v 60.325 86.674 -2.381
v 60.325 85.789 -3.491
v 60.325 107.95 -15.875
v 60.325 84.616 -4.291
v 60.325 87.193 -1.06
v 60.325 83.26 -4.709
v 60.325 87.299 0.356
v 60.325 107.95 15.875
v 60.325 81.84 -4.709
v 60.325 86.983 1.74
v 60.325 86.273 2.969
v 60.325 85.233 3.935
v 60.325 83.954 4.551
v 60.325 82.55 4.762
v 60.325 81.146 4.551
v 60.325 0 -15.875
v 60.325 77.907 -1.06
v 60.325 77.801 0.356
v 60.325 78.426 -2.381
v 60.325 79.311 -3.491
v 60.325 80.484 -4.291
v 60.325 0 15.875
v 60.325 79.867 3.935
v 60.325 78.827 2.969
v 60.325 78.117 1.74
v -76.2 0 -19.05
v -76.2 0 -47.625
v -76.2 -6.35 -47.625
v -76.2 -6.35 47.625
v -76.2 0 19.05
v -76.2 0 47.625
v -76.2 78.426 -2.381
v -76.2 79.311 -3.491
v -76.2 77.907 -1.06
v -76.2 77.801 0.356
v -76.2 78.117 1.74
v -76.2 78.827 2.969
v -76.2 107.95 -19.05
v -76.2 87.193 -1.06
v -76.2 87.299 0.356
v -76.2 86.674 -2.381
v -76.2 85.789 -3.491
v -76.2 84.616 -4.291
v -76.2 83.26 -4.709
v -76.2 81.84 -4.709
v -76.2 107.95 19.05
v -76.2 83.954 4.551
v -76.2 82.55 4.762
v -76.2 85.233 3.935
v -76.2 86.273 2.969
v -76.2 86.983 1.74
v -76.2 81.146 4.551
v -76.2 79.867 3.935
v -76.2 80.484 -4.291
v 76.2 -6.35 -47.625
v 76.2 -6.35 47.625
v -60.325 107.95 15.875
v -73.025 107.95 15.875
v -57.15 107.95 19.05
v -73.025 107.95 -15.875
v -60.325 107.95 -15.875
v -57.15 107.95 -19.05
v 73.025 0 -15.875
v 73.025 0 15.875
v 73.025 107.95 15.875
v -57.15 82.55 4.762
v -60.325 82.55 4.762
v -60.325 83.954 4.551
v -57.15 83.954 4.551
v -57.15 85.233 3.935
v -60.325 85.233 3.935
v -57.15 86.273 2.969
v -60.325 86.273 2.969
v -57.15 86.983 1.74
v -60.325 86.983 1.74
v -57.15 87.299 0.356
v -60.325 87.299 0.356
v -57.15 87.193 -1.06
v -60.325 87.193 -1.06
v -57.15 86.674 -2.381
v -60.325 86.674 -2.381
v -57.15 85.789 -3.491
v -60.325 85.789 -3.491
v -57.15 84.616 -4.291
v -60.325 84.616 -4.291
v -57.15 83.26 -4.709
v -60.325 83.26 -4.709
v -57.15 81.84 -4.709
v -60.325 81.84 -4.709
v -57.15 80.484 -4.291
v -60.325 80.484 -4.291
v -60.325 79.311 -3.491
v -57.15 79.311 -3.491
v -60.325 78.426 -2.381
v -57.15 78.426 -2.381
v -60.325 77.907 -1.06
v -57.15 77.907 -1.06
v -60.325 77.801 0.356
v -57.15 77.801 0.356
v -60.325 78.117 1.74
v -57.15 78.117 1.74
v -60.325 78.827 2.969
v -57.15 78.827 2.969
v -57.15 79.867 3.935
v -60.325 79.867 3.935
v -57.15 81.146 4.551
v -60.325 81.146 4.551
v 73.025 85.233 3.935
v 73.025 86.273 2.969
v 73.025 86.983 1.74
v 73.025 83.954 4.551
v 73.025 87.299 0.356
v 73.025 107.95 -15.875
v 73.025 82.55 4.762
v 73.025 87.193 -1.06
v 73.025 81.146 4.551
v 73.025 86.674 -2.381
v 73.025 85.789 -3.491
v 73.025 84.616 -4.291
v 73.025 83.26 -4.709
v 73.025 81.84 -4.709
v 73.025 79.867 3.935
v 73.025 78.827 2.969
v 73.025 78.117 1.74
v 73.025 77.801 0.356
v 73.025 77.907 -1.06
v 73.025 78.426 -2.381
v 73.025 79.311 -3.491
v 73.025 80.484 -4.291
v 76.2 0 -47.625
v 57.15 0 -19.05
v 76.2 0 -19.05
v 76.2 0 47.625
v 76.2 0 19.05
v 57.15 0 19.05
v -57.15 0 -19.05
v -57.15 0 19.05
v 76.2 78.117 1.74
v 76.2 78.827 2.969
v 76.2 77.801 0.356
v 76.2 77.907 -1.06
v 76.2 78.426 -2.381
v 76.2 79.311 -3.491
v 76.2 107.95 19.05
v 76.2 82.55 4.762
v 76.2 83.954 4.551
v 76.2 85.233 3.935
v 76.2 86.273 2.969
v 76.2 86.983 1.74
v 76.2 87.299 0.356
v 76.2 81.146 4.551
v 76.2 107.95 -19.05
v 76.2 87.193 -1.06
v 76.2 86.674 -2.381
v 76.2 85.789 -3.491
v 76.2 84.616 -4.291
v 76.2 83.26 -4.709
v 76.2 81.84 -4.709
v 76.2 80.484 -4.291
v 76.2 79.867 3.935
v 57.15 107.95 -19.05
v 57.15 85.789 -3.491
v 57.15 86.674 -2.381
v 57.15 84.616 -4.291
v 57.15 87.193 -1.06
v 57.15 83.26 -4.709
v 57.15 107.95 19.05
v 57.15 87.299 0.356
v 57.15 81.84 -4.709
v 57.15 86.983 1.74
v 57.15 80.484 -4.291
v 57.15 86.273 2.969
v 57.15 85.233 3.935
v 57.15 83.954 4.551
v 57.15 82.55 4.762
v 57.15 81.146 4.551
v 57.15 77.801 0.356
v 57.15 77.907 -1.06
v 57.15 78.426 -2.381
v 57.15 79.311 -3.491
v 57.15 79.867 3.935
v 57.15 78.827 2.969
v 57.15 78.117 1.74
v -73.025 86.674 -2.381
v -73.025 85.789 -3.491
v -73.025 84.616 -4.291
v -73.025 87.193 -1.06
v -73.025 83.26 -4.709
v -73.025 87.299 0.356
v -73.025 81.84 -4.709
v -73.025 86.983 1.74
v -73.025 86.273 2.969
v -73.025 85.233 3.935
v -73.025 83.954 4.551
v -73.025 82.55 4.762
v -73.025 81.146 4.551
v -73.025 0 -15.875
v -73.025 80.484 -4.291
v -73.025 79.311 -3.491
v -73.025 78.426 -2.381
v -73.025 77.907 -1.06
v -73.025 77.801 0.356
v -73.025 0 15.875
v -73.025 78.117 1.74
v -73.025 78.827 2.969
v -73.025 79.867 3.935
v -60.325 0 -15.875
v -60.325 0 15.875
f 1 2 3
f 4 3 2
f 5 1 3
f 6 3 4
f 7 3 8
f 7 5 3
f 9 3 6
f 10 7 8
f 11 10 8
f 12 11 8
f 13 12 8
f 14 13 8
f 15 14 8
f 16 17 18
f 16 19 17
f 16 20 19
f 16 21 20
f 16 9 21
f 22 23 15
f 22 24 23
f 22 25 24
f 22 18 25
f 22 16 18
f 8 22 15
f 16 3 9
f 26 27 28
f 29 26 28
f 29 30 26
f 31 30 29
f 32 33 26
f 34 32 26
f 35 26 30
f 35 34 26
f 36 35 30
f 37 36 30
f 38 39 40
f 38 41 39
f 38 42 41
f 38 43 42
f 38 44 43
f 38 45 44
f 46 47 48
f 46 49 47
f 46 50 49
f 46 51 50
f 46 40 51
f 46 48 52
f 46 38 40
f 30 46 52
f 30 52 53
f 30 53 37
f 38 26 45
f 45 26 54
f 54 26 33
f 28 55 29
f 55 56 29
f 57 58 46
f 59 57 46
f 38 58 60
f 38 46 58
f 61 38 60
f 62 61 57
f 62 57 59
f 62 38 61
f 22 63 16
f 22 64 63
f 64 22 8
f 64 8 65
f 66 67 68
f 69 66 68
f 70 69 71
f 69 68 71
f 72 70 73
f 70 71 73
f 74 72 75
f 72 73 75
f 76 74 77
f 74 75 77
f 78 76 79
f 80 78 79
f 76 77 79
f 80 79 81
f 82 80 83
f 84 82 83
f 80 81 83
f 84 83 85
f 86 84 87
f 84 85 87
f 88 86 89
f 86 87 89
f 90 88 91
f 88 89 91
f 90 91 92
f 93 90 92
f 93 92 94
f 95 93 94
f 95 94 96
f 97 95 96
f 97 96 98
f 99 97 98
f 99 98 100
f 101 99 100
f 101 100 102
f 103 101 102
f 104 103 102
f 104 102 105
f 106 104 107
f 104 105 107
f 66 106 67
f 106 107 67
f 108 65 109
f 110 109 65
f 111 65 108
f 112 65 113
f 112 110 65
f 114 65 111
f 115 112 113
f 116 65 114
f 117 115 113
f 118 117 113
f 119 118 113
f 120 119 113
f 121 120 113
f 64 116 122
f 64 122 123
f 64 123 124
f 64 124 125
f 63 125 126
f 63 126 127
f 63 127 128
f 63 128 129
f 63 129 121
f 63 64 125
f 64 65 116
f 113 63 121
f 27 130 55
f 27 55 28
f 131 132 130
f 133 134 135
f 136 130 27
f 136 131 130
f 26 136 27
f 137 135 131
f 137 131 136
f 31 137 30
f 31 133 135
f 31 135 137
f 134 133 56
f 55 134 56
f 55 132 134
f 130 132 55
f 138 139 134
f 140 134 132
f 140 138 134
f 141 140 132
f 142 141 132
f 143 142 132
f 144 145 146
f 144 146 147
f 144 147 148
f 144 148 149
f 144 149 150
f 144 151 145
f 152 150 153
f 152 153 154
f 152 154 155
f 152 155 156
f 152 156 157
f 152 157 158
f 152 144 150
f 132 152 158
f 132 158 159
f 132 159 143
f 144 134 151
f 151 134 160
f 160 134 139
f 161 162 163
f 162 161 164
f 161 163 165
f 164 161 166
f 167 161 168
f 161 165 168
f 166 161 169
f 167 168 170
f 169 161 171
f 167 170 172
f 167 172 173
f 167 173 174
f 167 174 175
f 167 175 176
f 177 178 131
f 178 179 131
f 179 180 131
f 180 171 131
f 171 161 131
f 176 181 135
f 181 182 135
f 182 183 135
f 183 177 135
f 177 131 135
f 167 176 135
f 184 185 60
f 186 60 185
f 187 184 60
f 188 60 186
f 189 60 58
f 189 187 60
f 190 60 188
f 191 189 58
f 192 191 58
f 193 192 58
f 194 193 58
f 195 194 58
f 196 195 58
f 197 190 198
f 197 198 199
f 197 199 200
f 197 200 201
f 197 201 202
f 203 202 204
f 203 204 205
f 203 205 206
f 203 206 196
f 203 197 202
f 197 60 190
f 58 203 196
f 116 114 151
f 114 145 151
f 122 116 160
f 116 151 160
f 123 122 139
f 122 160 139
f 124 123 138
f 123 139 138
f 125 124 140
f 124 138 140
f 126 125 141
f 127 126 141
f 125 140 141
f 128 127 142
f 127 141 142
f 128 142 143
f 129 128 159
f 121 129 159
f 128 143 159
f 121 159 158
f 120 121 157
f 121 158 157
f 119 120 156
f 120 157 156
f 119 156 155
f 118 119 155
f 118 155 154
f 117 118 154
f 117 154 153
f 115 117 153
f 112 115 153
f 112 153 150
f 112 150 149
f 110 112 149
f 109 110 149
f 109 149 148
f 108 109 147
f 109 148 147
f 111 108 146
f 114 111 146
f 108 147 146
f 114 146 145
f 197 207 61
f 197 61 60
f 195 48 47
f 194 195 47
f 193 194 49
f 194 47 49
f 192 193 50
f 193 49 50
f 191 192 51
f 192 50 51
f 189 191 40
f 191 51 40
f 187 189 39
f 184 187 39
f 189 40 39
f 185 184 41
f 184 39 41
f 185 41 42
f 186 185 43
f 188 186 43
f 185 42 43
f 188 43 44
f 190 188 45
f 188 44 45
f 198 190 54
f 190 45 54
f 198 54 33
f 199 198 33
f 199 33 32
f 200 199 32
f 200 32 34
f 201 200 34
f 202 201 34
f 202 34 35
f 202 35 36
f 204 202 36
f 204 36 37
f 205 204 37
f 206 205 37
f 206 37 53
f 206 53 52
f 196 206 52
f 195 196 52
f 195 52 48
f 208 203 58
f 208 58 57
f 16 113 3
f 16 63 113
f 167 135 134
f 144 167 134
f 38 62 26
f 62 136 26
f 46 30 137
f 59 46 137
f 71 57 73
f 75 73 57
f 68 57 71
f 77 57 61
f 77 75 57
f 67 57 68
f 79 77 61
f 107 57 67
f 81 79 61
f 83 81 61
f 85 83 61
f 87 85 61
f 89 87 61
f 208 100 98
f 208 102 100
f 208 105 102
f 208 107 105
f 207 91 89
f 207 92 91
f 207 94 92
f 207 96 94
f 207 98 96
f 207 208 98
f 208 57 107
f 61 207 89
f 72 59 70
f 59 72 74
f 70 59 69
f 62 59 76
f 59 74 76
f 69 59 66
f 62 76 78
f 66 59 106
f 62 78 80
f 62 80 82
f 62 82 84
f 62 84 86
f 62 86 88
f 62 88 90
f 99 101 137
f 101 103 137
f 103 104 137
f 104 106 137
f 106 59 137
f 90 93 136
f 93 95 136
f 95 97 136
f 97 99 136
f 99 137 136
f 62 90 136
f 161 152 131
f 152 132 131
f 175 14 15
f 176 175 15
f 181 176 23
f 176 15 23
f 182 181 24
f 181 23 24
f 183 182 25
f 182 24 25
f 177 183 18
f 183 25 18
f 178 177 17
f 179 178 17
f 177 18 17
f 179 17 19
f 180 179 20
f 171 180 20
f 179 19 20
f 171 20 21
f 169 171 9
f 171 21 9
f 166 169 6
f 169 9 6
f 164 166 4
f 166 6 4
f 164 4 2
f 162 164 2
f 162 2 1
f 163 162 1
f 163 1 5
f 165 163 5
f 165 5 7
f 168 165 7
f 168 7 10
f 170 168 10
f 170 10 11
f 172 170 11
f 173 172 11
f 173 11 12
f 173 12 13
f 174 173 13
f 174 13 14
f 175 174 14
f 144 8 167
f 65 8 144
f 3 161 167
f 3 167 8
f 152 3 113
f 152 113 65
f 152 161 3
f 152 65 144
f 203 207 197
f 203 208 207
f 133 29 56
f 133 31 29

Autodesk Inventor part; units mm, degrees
ref_plane "XZ Plane" through (0, 0, 0) normal (0, 1, 0) x (-1, 0, 0)
ref_plane "XY Plane" through (0, 0, 0) normal (0, 0, 1) x (1, 0, 0)
sketch "Sketch1" plane through (0, 0, 0) normal (0, 1, 0) x (-1, 0, 0)
  line L0 (76.2, 47.625) -> (-76.2, 47.625)
  line L1 (-76.2, 47.625) -> (-76.2, -47.625)
  line L2 (-76.2, -47.625) -> (76.2, -47.625)
  line L3 (76.2, -47.625) -> (76.2, 47.625)
  line L4 (76.2, 47.625) -> (-76.2, -47.625) construction
  line L5 (-76.2, 47.625) -> (76.2, -47.625) construction
  point P0 (0, 0)
  dimension "d0" = 152.4
  dimension "d1" = 95.25
extrude "Extrusion1" add sketch "Sketch1" against normal blind 6.35
sketch "Sketch4" plane through (0, 0, 0) normal (0, 1, 0) x (1, 0, 0)
  line L0 (-76.2, -19.05) -> (-57.15, -19.05)
  line L1 (-57.15, -19.05) -> (-57.15, 19.05)
  line L2 (-57.15, 19.05) -> (-76.2, 19.05)
  line L3 (-76.2, 19.05) -> (-76.2, -19.05)
  line L4 (-76.2, -19.05) -> (-57.15, 19.05) construction
  line L5 (-57.15, -19.05) -> (-76.2, 19.05) construction
  line L6 (-76.2, 47.625) -> (-76.2, -47.625) projected
  line L7 (-73.025, -15.875) -> (-60.325, -15.875)
  line L8 (-60.325, -15.875) -> (-60.325, 15.875)
  line L9 (-60.325, 15.875) -> (-73.025, 15.875)
  line L10 (-73.025, 15.875) -> (-73.025, -15.875)
  line L11 (-73.025, -15.875) -> (-60.325, 15.875) construction
  line L12 (-60.325, -15.875) -> (-73.025, 15.875) construction
  point P0 (0, 0)
  point P1 (-66.675, 0)
  dimension "d8" = 0
  dimension "d9" = 38.1
  dimension "d10" = 19.05
  dimension "d11" = 3.175
  dimension "d12" = 3.175
extrude "Extrusion2" add sketch "Sketch4" along normal blind 107.95
sketch "Sketch5" plane through (-76.2, -6.35, -47.625) normal (-1, 0, 0) x (0, 0, 1)
  circle A0 centre (47.625, 88.9) radius 4.7625
  line L0 (28.575, 114.3) -> (66.675, 114.3) projected
  line L1 (47.625, 6.35) -> (47.625, 114.3) construction
  dimension "d15" = 9.525
  dimension "d16" = 25.4
  dimension "d19" = 0
extrude "Extrusion3" cut sketch "Sketch5" against normal through all
mirror "Mirror1" about plane through (0, 0, 0) normal (1, 0, 0) of "Extrusion2", "Extrusion3"
equation "\"d0\" = baseWidth"
equation "\"d1\" = baseLength"
equation "\"d2\" = baseThickness"
equation "\"d9\" = postLength"
equation "\"d10\" = postWidth"
equation "\"d11\" = postWallThickness"
equation "\"d12\" = postWallThickness"
equation "\"d13\" = postHeight"
equation "\"d15\" = postAxelDiam"
equation "\"d16\" = heightFromTopToAxelCenter"
equation "\"d17\" = postHeight"
equation "\"baseWidth\" = 152.4"
equation "\"baseLength\" = 95.25"
equation "\"baseThickness\" = 6.35"
equation "\"postWidth\" = 19.05"
equation "\"postLength\" = 38.1"
equation "\"postWallThickness\" = 3.175"
equation "\"postAxelDiam\" = 9.525"
equation "\"heightFromTopToAxelCenter\" = 25.4"
equation "\"diamOfSproketPlusChain\" = 152.4"
equation "\"radiusOfSprocket\" = 0.5 * diamOfSproketPlusChain"
equation "\"heightOfAxelAboveBasePlate\" = radiusOfSprocket + gapBetweenChainAndBasePlate"
equation "\"gapBetweenChainAndBasePlate\" = 6.35"
equation "\"heightAboveRobotPlate\" = 50.8"
equation "\"postHeight\" = 107.95"
properties part number "MiddlePostsForTwoSprockets"
